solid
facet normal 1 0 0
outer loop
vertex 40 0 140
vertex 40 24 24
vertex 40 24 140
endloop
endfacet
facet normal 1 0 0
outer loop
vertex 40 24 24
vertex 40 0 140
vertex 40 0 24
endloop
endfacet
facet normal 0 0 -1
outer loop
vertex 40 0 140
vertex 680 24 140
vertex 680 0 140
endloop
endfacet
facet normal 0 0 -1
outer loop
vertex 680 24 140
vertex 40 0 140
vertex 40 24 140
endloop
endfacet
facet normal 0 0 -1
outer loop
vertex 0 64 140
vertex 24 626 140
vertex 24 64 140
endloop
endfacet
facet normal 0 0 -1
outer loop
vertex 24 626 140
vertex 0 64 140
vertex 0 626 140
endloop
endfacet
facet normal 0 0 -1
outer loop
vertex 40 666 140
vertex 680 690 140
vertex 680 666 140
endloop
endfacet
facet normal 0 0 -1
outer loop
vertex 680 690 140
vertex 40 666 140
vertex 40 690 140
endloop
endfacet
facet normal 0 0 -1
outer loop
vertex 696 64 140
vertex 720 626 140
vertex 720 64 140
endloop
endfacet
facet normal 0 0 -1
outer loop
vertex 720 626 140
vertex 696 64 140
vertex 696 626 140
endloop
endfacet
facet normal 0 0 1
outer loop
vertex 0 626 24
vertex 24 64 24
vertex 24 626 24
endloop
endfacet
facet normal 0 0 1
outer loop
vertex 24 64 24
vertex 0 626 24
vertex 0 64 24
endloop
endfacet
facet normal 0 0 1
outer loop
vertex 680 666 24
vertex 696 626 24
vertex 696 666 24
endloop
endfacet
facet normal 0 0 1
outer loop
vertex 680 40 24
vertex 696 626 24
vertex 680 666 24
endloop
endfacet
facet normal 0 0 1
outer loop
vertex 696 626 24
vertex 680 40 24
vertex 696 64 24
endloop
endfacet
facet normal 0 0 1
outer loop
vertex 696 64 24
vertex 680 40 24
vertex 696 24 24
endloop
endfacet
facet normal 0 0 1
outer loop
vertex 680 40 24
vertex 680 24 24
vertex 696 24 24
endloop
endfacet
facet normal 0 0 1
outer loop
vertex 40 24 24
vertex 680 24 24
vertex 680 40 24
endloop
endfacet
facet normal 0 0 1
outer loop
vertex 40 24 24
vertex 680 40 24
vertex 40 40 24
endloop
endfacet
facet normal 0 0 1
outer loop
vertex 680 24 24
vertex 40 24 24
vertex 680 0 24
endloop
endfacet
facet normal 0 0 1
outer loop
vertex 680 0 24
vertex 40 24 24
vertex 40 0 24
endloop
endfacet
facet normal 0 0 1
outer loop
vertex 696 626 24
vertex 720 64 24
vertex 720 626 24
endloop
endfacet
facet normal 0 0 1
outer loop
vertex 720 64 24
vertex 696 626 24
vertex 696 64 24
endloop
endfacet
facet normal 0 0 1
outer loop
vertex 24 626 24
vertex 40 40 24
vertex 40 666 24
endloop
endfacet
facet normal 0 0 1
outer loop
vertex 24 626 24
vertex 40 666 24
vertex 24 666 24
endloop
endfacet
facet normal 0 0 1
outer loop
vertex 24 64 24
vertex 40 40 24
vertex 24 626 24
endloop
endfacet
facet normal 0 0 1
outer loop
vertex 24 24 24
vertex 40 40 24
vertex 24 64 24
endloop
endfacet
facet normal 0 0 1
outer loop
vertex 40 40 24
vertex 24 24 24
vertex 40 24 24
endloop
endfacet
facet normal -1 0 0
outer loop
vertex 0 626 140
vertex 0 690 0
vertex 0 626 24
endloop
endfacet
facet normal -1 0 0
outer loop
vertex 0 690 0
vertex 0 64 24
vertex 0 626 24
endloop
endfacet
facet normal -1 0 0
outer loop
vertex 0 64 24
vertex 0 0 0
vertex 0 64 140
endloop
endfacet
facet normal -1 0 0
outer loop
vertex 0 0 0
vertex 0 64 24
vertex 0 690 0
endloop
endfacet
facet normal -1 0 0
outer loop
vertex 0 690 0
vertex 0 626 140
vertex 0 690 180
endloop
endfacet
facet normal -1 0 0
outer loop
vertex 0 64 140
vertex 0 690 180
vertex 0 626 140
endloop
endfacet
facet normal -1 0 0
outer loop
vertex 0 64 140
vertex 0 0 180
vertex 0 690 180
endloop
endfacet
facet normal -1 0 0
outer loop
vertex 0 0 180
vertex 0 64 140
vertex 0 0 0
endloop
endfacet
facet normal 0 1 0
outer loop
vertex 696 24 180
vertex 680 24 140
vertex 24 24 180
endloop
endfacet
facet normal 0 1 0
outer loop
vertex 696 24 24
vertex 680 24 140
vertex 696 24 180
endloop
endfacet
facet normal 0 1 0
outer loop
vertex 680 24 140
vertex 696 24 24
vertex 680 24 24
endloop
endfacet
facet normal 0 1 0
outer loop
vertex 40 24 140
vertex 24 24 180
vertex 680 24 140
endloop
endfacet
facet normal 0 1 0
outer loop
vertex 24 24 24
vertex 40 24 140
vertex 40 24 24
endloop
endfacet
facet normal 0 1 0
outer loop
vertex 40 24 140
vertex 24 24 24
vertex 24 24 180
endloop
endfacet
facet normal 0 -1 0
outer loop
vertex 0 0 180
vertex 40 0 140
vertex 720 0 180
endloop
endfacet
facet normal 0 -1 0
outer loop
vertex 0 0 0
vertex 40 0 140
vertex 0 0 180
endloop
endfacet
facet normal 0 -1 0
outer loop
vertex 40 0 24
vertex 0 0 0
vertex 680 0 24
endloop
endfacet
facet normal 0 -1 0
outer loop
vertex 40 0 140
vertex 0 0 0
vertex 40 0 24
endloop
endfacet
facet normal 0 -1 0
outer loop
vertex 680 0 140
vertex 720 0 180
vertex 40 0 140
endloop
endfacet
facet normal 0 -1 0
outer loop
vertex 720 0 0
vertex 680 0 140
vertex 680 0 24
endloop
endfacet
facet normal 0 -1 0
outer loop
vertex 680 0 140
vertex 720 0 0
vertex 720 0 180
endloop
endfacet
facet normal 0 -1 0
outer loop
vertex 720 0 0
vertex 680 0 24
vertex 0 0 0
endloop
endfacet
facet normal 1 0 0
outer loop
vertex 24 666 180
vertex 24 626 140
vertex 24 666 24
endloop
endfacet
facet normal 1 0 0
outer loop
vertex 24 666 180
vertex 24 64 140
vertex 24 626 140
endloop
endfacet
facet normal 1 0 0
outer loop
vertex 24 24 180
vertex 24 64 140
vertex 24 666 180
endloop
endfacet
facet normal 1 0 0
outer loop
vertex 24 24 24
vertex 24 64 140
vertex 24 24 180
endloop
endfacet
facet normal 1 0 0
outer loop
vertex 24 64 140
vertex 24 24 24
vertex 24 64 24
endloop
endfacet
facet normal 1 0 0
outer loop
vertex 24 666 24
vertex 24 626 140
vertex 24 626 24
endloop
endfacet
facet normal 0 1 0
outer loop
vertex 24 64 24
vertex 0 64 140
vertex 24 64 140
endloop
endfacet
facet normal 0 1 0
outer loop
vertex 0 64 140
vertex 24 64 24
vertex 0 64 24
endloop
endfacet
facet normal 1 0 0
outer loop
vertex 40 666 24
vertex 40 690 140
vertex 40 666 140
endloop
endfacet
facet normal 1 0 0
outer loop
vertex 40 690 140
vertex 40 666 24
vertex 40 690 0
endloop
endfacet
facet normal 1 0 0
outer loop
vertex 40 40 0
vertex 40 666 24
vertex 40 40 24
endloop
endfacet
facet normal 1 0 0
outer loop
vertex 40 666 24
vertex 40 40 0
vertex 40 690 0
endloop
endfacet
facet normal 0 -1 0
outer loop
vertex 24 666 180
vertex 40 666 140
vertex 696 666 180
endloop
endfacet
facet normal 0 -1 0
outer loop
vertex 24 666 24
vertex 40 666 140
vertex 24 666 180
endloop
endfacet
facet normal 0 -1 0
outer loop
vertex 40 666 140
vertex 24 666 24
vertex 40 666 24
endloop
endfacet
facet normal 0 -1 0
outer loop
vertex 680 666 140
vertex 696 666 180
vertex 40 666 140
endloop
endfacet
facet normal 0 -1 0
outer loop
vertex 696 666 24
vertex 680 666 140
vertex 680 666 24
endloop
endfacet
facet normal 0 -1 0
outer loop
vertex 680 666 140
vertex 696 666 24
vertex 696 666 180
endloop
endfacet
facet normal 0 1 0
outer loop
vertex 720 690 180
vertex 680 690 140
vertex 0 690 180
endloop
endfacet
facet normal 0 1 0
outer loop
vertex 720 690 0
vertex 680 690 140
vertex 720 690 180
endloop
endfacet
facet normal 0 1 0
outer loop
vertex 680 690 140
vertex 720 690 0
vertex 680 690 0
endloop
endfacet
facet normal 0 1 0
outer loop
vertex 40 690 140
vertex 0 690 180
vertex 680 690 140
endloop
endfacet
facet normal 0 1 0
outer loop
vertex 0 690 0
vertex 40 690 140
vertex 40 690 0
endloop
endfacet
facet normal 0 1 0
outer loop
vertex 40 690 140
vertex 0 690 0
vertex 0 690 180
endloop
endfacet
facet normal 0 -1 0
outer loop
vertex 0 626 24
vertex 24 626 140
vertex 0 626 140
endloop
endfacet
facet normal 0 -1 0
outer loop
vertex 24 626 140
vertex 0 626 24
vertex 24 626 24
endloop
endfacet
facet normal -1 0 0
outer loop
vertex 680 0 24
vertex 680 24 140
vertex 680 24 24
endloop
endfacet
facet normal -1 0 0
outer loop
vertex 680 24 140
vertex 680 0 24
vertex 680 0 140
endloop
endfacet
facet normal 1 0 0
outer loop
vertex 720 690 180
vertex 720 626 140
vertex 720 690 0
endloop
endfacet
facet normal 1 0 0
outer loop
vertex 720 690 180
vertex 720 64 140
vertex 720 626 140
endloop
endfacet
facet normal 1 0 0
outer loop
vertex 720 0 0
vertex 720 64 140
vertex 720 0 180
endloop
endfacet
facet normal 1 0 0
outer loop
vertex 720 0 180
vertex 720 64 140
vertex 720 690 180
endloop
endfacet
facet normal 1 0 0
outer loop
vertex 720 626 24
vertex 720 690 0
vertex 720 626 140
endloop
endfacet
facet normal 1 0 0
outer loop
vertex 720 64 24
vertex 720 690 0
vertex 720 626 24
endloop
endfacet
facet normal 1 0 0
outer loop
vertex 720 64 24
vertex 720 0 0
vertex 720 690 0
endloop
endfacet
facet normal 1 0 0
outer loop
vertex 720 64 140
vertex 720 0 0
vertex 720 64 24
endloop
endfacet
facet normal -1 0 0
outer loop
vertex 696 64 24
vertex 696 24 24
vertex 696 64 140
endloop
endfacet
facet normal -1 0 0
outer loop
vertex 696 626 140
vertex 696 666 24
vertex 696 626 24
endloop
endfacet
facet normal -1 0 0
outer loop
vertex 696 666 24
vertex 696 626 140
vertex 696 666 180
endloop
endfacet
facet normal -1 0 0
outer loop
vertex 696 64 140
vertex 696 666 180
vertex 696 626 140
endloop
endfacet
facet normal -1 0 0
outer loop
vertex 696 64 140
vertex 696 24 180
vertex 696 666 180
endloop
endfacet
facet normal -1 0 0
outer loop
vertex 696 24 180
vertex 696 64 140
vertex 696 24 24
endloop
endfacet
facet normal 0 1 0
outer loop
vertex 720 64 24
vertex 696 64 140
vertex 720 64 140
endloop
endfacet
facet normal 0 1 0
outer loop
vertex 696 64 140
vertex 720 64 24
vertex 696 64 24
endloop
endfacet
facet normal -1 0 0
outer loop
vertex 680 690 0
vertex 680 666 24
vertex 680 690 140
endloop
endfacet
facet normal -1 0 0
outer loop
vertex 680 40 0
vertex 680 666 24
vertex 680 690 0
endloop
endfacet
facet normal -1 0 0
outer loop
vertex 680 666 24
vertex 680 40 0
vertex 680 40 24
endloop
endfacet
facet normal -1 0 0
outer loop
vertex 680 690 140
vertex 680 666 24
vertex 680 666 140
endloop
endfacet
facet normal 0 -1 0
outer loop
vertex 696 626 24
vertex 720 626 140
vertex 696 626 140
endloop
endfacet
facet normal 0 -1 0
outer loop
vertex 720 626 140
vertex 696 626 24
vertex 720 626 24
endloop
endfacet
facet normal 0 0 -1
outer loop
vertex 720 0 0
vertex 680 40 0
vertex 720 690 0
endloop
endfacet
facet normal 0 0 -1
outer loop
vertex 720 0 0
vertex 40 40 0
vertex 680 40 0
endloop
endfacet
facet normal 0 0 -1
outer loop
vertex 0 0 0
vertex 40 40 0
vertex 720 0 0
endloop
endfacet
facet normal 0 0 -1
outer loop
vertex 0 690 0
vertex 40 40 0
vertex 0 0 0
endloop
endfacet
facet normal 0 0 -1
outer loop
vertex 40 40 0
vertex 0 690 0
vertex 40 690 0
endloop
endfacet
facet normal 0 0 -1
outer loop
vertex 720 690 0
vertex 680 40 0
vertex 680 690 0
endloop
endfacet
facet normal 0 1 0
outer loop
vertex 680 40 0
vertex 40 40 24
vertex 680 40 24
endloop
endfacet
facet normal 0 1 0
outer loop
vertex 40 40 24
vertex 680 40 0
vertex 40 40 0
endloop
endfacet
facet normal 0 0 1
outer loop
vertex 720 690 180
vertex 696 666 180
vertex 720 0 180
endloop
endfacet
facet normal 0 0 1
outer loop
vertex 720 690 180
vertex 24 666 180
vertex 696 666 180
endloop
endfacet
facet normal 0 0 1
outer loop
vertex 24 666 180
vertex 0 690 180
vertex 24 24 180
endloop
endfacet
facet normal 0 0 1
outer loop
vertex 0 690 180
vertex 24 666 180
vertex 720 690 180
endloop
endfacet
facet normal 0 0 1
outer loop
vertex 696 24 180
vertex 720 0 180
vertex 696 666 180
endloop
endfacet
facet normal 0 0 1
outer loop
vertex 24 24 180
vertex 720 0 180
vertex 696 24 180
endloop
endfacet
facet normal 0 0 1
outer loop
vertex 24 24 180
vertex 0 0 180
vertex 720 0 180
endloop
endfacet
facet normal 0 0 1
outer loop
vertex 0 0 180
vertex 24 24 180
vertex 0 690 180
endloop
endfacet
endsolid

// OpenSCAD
/*
    Alexander Sosna <alexander@sosna.de>

    Frame to convert a VW Sharan II / Seat Alhambra II to a camper.
    
    What you need:
    - 2 x this frame
    - 5 x container (Euronorm/Eurobehälter/Kleinladungsträger) 600 mm × 400 mm x 320 mm
    - mattress 200 cm x 140 cm
*/


length=720;
width=690;
hight=180;
b_width=40;
b_hight=24;

// Stützen
module sturdy() {
    translate([0,0,b_hight]){
        color( "GreenYellow", 1.0 ) {
            a_sturdy=[b_width,b_hight,hight-b_hight-b_width];
            echo("Stütze A",a_sturdy);
            cube(a_sturdy);
        }
        translate([0,b_hight,0]) {
            // Rechte Bodenlatte
            color( "Lime", 1.0 ) {
                b_sturdy=[b_hight,b_width,hight-b_hight-b_width];
                echo("Stütze B",b_sturdy);
                cube(b_sturdy);
            }
        }
    }
}

// Linke Bodenlatte
color( "ForestGreen", 1.0 ) {
    l_bodenlatte=[length,b_width,b_hight];
    echo("Linke Bodenlatte",l_bodenlatte);
    cube(l_bodenlatte);
}

translate([0,b_width,0]) {
    // Vordere Bodenlatte
    v_bodenlatte=[b_width,width-b_width,b_hight];
    echo("Vordere Bodenlatte",v_bodenlatte);
    cube(v_bodenlatte);
}

translate([length-b_width,b_width,0]) {
    // Hintere Bodenlatte
    h_bodenlatte=[b_width,width-b_width,b_hight];
    echo("Hintere Bodenlatte",h_bodenlatte);
    cube(h_bodenlatte);
}

 translate([0,width-b_width,0]) {
    // Rechte Bodenlatte
    //cube([length,b_width,b_hight]);
}

translate([0,b_hight,hight-b_width]) {
    // Vordere Deckenlatte
    v_deckenlatte=[b_hight,width-2*b_hight,b_width];
    echo("Vordere Deckenlatte",v_deckenlatte);
    cube(v_deckenlatte);
}

 translate([0,0,hight-b_width]) {
    // Linke Deckenlatte
    color( "ForestGreen", 1.0 ) {
        l_deckenlatte=[length,b_hight,b_width];
        echo("Linke Deckenlatte",l_deckenlatte);
        cube(l_deckenlatte);
    }
}
    
 translate([0,width-b_hight,hight-b_width]) {
    // Rechte Deckenlatte
    color( "ForestGreen", 1.0 ) {
        r_deckenlatte=[length,b_hight,b_width];
        echo("Rechte Deckenlatte",r_deckenlatte);
        cube(r_deckenlatte);
    }
}

translate([length-b_hight,b_hight,hight-b_width]) {
    // Hintere Deckenlatte
    h_deckenlatte=[b_hight,width-2*b_hight,b_width];
    echo("Hintere Deckenlatte",h_deckenlatte);
    cube(h_deckenlatte);
}


// Vorne links
sturdy();

// Vorne rechts
translate([0,width,0]) {
    mirror([0,1,0]){
        sturdy();
    }
}

// Hinten links
translate([length,0,0]) {
    mirror([1,0,0]){
        sturdy();
    }
}

// Hinten rechts
translate([length,width,0]) {
    mirror([1,0,0]){
        mirror([0,1,0]){
            sturdy();
        }
    }
}
